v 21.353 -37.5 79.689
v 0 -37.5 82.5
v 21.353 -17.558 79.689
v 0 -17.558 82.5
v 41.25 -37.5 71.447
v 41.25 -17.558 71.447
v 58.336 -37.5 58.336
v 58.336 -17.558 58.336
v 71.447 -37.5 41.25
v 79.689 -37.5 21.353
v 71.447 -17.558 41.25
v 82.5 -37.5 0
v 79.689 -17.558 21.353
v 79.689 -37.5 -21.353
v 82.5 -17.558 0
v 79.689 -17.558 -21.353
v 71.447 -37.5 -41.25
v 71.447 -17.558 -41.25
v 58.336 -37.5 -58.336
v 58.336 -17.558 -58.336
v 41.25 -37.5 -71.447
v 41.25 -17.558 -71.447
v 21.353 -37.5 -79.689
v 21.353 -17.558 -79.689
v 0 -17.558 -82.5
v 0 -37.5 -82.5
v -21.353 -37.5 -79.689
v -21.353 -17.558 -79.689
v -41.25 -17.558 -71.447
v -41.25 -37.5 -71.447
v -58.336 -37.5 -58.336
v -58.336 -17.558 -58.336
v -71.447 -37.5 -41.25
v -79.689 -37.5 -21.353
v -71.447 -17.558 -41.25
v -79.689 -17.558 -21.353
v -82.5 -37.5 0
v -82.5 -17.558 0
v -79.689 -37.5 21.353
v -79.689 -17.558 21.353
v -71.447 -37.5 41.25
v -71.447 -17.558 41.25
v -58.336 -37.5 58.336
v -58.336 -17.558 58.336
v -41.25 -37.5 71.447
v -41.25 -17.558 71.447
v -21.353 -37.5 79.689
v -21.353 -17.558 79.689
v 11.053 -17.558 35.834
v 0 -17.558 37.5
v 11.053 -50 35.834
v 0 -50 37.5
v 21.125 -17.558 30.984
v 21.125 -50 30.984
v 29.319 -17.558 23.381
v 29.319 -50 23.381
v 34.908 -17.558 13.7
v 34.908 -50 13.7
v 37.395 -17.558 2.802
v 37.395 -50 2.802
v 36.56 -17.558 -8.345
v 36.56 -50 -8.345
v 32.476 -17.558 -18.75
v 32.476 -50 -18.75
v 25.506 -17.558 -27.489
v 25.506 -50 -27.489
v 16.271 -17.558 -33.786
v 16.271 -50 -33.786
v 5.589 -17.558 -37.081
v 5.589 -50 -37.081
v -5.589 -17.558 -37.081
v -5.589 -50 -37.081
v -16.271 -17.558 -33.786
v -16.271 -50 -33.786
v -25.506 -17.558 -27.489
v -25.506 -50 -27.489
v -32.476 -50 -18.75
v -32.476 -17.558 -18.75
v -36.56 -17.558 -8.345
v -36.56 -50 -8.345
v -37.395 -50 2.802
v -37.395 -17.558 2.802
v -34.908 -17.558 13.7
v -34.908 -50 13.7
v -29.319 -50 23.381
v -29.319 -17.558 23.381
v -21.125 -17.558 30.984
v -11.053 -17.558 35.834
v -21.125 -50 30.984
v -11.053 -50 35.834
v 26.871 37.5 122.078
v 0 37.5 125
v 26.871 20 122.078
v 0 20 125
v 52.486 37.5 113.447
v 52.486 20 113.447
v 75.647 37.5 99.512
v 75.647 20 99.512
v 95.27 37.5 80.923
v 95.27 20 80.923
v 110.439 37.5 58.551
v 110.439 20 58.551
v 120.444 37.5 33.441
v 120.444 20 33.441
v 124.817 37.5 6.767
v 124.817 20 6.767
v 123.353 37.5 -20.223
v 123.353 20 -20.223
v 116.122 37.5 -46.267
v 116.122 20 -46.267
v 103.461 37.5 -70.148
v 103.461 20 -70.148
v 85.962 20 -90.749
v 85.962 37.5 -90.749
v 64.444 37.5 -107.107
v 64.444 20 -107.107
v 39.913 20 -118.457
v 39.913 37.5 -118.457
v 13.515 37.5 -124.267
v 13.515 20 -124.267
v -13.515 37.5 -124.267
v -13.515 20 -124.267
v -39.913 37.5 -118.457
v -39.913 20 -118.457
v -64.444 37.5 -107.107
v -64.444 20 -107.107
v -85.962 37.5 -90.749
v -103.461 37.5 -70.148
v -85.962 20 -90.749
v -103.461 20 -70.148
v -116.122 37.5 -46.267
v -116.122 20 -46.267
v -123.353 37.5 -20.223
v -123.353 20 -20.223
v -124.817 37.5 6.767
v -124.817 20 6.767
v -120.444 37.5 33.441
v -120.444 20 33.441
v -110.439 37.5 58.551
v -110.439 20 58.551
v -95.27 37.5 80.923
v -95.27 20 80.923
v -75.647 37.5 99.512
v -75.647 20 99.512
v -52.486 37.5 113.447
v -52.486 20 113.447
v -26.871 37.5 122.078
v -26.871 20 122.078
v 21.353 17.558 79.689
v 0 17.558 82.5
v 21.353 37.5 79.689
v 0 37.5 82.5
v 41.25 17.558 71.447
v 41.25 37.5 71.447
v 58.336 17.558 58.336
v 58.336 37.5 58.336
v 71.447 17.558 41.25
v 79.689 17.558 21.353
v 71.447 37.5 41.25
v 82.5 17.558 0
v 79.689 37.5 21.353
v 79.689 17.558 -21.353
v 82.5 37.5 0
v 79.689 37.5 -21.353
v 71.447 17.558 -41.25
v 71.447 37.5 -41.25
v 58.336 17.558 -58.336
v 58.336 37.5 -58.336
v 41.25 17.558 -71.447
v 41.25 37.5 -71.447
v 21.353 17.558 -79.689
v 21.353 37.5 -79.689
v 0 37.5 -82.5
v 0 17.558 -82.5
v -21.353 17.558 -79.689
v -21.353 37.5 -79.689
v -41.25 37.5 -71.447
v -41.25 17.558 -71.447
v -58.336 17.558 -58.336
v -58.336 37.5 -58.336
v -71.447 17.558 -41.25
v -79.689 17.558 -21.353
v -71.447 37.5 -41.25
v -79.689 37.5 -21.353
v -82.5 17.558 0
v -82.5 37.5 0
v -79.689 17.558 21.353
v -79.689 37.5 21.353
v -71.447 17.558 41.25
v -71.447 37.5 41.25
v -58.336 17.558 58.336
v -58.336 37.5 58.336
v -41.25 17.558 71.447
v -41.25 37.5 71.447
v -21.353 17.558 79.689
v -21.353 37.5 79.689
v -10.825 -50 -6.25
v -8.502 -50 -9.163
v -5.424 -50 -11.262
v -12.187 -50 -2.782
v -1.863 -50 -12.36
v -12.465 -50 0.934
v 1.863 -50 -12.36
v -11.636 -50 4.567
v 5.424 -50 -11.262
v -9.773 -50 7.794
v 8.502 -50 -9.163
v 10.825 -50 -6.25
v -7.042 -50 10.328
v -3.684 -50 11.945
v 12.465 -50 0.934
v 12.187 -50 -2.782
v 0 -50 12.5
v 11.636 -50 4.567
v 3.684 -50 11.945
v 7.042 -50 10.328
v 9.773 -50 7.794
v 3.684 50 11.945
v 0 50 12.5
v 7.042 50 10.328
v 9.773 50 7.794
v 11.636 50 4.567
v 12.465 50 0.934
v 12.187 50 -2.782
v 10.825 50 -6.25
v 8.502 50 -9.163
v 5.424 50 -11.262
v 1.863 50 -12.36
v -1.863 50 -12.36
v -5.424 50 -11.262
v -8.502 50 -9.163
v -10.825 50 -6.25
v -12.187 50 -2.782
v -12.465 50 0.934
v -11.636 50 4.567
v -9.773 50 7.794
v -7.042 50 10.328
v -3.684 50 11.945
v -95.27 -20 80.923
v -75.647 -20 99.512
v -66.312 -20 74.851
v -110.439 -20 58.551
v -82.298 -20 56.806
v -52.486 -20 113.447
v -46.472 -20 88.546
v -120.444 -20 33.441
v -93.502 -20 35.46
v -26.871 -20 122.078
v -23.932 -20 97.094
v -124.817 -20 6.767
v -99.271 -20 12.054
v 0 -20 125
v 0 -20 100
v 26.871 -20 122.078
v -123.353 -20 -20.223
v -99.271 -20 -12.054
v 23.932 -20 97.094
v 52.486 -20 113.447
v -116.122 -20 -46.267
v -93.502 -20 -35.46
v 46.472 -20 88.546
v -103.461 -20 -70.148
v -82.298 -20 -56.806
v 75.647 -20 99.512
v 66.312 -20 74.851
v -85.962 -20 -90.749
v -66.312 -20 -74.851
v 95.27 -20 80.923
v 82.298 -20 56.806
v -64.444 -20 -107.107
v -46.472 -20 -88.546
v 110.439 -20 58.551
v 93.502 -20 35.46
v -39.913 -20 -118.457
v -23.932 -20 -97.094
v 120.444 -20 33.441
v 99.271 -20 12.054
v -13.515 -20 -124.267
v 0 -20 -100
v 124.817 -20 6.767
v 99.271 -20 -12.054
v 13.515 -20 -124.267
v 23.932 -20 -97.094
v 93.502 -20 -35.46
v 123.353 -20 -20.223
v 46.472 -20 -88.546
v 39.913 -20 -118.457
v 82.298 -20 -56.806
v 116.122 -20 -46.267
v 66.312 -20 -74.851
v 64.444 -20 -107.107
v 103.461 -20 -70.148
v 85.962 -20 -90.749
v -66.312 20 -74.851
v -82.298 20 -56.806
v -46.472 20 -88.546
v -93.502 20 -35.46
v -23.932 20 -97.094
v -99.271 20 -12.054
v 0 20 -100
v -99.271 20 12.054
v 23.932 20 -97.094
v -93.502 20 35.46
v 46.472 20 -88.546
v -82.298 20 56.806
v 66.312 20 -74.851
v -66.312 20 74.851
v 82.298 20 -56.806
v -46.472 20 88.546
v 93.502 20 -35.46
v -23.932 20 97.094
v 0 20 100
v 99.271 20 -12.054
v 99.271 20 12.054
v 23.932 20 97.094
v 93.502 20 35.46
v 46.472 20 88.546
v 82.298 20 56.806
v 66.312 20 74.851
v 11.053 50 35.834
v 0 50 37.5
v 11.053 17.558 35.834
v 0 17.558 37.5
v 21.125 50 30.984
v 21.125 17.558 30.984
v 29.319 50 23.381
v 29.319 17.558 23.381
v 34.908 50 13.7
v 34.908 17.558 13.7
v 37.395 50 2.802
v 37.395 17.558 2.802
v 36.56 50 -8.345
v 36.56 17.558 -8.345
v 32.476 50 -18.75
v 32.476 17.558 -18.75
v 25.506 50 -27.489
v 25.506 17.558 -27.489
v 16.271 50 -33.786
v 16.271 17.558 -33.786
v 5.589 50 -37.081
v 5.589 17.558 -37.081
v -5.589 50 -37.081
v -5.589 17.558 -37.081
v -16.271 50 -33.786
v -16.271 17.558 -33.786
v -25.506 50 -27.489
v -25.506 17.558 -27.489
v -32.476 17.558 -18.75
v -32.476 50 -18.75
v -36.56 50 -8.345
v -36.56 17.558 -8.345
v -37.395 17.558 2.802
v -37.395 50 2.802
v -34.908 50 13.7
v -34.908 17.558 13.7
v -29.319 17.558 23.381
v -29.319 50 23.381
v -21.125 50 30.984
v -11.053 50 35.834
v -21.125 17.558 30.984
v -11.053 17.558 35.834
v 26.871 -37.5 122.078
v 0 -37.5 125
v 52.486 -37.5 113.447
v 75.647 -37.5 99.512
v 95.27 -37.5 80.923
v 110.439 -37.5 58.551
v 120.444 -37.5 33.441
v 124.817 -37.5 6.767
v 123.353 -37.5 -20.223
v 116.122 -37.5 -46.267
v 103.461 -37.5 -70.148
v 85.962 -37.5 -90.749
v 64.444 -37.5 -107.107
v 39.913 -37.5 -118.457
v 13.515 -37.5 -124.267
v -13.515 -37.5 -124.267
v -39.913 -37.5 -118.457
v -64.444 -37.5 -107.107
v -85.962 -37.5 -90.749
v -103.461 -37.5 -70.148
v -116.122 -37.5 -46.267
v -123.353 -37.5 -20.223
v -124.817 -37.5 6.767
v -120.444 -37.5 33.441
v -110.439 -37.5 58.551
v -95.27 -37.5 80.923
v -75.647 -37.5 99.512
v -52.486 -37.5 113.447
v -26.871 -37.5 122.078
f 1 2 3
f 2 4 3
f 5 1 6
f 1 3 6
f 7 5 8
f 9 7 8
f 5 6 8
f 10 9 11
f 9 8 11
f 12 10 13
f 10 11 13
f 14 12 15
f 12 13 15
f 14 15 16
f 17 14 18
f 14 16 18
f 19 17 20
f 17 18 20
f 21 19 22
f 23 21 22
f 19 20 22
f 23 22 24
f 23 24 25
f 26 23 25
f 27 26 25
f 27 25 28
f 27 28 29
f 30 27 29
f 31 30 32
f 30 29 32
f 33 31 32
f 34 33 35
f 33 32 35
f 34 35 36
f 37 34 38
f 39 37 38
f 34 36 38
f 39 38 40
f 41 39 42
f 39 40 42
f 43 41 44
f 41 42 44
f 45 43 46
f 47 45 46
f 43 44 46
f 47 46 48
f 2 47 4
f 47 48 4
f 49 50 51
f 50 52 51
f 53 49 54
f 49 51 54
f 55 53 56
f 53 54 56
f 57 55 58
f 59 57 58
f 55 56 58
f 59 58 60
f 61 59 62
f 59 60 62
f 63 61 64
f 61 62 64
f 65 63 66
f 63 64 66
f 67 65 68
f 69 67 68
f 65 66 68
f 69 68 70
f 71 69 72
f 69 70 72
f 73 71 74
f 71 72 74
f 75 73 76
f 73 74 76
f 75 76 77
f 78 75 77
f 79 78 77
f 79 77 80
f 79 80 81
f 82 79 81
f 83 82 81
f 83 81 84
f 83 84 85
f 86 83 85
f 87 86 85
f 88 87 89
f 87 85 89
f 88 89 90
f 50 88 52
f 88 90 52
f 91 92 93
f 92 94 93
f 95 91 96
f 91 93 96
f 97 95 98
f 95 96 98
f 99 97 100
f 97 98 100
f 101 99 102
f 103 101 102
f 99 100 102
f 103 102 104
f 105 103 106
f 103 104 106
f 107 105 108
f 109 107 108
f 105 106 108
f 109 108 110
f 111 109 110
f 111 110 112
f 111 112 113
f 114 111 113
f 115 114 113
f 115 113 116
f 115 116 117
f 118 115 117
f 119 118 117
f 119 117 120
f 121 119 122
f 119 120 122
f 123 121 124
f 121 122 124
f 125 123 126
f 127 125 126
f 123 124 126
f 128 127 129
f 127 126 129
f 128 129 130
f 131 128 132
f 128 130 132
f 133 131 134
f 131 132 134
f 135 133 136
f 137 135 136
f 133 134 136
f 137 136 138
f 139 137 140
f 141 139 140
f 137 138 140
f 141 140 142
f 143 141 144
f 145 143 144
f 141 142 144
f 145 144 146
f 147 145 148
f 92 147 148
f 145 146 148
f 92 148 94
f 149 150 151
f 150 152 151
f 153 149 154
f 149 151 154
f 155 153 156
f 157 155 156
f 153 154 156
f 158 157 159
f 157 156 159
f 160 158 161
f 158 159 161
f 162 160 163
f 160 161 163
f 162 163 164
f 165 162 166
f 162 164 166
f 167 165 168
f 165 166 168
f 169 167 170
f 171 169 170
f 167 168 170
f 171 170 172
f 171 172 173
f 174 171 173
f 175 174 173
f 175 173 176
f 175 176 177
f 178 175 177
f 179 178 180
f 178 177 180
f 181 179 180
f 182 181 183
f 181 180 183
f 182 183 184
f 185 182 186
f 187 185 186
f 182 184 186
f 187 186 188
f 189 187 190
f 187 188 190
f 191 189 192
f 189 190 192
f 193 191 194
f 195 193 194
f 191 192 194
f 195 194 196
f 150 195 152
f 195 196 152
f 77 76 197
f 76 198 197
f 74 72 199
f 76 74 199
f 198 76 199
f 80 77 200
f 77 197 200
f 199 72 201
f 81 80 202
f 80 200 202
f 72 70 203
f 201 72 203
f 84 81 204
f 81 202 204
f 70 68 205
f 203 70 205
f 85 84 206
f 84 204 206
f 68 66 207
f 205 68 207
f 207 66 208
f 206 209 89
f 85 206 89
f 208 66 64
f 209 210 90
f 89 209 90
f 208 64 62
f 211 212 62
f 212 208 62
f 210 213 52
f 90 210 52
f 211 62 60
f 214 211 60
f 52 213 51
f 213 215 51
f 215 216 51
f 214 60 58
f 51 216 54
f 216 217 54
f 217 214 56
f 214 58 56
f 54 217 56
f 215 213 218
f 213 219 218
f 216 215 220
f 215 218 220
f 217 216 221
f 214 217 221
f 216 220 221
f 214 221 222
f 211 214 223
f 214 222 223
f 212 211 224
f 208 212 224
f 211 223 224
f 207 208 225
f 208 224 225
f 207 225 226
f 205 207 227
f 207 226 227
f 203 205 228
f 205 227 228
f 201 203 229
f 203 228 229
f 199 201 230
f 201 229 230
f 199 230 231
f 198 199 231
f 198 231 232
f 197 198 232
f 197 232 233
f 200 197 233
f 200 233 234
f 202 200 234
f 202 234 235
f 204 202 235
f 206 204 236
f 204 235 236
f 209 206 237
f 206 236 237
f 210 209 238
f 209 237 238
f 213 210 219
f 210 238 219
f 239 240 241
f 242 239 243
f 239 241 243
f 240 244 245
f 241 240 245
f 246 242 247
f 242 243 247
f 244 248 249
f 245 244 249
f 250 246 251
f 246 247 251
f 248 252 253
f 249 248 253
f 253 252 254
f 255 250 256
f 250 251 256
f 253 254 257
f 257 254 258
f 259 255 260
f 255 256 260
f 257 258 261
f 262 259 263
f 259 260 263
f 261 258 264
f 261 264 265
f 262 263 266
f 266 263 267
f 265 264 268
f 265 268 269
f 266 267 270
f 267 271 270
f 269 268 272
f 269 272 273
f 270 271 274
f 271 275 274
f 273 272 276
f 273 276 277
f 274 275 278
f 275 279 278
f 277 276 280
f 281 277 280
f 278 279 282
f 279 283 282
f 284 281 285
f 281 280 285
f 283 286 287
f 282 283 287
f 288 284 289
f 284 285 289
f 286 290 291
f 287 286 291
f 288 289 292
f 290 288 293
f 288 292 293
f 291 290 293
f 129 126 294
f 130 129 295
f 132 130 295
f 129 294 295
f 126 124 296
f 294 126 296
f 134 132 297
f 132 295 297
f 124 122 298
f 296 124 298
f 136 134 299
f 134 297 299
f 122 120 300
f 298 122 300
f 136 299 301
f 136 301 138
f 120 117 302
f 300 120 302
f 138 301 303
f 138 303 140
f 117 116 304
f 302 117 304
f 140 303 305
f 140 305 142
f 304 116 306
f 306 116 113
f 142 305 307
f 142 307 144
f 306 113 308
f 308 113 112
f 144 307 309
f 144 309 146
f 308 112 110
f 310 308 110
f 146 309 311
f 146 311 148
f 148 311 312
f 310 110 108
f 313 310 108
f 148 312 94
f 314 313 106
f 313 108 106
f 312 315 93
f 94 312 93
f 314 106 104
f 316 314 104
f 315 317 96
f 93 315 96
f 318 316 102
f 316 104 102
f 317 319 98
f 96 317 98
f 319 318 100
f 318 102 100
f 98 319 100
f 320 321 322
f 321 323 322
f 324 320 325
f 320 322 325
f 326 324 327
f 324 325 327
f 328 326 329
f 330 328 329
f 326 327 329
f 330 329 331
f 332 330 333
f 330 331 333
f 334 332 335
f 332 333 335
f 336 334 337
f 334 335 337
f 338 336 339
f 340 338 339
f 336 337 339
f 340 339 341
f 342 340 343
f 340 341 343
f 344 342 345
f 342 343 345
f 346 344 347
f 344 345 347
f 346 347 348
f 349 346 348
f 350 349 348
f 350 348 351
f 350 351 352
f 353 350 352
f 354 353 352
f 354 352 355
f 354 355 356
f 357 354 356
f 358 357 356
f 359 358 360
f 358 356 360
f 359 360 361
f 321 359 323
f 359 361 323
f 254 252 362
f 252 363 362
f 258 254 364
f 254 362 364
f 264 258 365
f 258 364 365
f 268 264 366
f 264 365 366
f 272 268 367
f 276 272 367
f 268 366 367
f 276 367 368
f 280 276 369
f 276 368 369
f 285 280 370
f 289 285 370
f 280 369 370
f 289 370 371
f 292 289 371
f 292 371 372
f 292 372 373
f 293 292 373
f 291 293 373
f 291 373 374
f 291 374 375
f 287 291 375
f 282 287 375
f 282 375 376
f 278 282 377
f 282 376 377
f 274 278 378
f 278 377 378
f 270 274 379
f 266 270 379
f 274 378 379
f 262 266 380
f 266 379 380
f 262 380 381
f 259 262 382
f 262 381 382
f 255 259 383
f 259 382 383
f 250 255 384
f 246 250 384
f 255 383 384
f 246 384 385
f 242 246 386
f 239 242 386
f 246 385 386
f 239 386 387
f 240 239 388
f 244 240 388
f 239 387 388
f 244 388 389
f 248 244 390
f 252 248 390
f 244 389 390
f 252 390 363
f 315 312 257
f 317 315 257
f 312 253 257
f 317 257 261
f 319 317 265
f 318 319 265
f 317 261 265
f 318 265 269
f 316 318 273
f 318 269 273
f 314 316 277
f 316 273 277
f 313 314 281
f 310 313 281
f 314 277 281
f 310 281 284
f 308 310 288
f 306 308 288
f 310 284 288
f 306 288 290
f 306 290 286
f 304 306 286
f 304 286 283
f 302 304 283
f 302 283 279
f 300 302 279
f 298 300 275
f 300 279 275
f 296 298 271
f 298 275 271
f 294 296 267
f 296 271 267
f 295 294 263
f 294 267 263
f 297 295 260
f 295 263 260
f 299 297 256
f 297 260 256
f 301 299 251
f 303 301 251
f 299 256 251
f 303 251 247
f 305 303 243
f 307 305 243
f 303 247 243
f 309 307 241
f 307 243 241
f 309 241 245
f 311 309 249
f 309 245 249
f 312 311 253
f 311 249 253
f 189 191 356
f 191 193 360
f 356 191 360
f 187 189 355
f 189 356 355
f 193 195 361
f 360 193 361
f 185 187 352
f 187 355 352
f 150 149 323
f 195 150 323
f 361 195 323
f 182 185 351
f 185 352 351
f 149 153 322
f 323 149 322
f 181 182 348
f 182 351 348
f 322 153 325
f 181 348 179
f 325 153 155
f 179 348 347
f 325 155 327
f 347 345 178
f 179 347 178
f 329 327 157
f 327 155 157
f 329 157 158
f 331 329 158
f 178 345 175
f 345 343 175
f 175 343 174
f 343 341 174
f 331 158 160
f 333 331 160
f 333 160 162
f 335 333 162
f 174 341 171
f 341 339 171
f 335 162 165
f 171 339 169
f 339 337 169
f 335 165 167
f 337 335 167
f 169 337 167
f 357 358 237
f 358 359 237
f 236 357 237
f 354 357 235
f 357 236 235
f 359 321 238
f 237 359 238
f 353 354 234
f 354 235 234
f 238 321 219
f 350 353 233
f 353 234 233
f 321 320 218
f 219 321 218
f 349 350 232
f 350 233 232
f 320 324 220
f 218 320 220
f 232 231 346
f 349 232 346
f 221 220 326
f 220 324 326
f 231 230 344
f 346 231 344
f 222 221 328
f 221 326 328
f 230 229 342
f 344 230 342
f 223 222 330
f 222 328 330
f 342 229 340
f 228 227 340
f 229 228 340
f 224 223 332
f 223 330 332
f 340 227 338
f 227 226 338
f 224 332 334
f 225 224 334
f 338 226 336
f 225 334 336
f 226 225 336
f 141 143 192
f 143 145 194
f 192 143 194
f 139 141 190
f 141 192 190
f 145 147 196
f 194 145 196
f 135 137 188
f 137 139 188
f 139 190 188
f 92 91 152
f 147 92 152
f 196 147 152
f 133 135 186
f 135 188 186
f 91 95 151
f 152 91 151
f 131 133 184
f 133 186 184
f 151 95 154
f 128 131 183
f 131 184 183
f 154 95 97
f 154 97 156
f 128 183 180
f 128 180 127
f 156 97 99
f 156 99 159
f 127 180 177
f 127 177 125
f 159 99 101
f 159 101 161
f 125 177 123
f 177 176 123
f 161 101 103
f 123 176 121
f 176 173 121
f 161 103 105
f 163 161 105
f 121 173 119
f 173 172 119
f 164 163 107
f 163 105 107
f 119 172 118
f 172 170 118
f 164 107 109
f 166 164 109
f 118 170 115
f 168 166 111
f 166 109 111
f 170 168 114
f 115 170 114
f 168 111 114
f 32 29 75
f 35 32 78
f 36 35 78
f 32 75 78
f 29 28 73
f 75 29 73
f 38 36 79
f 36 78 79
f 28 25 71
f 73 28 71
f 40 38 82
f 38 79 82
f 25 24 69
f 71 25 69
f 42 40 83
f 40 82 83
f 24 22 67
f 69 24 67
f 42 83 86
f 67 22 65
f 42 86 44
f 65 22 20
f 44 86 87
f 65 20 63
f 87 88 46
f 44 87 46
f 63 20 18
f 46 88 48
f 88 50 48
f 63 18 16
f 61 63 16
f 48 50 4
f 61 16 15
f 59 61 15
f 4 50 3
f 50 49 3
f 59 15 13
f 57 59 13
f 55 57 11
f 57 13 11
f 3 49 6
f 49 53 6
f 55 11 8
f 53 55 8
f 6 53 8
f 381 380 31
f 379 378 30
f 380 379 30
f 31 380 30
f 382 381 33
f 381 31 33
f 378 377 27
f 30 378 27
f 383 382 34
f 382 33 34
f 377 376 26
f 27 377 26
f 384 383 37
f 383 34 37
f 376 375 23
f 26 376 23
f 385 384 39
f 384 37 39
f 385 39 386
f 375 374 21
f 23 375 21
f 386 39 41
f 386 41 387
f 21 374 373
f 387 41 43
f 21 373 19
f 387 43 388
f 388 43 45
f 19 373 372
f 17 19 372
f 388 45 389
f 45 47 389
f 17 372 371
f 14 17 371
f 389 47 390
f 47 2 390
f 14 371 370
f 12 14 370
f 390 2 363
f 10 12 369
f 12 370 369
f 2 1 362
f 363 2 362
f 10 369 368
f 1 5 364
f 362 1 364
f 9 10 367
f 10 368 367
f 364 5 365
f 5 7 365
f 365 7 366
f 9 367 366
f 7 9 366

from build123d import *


with BuildPart() as f1:
    # F0 (on Right) → F1 (revolve)
    with BuildSketch(Plane.YZ):
        Polygon((-20, 125), (-37.5, 125), (-37.5, 82.5), (-17.558118, 82.5), (-17.558118, 37.5), (-50, 37.5), (-50, 12.5), (0, 12.5), (50, 12.5), (50, 37.5), (17.558118, 37.5), (17.558118, 82.5), (37.5, 82.5), (37.5, 125), (20, 125), (20, 100), (0, 100), (-20, 100), align=None)
    revolve(axis=Axis((0, -4.137259, 0), (0, 1, 0)))


solid = f1.part
